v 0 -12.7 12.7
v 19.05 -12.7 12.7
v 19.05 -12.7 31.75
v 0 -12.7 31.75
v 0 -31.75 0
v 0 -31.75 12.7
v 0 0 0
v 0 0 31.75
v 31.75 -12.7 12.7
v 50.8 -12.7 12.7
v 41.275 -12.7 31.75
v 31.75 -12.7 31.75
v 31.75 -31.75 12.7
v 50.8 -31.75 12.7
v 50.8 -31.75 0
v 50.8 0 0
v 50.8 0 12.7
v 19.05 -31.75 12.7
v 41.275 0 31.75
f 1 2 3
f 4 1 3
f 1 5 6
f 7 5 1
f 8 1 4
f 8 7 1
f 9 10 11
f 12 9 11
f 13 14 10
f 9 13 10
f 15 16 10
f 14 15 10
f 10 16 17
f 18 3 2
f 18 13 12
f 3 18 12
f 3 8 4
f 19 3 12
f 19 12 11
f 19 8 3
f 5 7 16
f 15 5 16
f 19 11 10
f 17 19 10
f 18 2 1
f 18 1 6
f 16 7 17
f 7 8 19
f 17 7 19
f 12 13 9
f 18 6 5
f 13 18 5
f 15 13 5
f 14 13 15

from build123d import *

# Parameters (mm, degrees)
F0_W     = 50.8
F0_H     = 31.75
F1_DEPTH = 31.75
F2_W     = 19.05
F2_H     = 19.05
F3_DEPTH = 19.05
F4_W     = 19.05
F4_H     = 19.05
F5_DEPTH = 19.05
F7_DEPTH = 12.7
F9_DEPTH = 12.7


with BuildPart() as f1:
    # F0 (on Front) → F1 (new body)
    with BuildSketch(Plane.XZ):
        with Locations((25.4, 15.875)):
            Rectangle(F0_W, F0_H)
    extrude(amount=F1_DEPTH)

    # F2 (on face) → F3 (cut)
    with BuildSketch(Plane.YZ.offset(50.8)):
        with Locations((-22.225, 22.225)):
            Rectangle(F2_W, F2_H)
    extrude(amount=-F3_DEPTH, mode=Mode.SUBTRACT)

    # F4 (on face) → F5 (cut)
    with BuildSketch(Plane(origin=(0, 0, 0), x_dir=(0, -1, 0), z_dir=(-1, 0, 0))):
        with Locations((22.225, 22.225)):
            Rectangle(F4_W, F4_H)
    extrude(amount=-F5_DEPTH, mode=Mode.SUBTRACT)

    # F6 (on face) → F7 (cut)
    with BuildSketch(Plane.XZ.offset(12.7)):
        Polygon((50.8, 31.75), (41.275, 31.75), (50.8, 12.7), align=None)
    extrude(amount=-F7_DEPTH, mode=Mode.SUBTRACT)

    # F8 (on face) → F9 (cut)
    with BuildSketch(Plane.YZ.offset(31.75)):
        Polygon((-31.75, 12.7), (-12.7, 31.75), (-31.75, 31.75), align=None)
    extrude(amount=-F9_DEPTH, mode=Mode.SUBTRACT)


solid = f1.part
